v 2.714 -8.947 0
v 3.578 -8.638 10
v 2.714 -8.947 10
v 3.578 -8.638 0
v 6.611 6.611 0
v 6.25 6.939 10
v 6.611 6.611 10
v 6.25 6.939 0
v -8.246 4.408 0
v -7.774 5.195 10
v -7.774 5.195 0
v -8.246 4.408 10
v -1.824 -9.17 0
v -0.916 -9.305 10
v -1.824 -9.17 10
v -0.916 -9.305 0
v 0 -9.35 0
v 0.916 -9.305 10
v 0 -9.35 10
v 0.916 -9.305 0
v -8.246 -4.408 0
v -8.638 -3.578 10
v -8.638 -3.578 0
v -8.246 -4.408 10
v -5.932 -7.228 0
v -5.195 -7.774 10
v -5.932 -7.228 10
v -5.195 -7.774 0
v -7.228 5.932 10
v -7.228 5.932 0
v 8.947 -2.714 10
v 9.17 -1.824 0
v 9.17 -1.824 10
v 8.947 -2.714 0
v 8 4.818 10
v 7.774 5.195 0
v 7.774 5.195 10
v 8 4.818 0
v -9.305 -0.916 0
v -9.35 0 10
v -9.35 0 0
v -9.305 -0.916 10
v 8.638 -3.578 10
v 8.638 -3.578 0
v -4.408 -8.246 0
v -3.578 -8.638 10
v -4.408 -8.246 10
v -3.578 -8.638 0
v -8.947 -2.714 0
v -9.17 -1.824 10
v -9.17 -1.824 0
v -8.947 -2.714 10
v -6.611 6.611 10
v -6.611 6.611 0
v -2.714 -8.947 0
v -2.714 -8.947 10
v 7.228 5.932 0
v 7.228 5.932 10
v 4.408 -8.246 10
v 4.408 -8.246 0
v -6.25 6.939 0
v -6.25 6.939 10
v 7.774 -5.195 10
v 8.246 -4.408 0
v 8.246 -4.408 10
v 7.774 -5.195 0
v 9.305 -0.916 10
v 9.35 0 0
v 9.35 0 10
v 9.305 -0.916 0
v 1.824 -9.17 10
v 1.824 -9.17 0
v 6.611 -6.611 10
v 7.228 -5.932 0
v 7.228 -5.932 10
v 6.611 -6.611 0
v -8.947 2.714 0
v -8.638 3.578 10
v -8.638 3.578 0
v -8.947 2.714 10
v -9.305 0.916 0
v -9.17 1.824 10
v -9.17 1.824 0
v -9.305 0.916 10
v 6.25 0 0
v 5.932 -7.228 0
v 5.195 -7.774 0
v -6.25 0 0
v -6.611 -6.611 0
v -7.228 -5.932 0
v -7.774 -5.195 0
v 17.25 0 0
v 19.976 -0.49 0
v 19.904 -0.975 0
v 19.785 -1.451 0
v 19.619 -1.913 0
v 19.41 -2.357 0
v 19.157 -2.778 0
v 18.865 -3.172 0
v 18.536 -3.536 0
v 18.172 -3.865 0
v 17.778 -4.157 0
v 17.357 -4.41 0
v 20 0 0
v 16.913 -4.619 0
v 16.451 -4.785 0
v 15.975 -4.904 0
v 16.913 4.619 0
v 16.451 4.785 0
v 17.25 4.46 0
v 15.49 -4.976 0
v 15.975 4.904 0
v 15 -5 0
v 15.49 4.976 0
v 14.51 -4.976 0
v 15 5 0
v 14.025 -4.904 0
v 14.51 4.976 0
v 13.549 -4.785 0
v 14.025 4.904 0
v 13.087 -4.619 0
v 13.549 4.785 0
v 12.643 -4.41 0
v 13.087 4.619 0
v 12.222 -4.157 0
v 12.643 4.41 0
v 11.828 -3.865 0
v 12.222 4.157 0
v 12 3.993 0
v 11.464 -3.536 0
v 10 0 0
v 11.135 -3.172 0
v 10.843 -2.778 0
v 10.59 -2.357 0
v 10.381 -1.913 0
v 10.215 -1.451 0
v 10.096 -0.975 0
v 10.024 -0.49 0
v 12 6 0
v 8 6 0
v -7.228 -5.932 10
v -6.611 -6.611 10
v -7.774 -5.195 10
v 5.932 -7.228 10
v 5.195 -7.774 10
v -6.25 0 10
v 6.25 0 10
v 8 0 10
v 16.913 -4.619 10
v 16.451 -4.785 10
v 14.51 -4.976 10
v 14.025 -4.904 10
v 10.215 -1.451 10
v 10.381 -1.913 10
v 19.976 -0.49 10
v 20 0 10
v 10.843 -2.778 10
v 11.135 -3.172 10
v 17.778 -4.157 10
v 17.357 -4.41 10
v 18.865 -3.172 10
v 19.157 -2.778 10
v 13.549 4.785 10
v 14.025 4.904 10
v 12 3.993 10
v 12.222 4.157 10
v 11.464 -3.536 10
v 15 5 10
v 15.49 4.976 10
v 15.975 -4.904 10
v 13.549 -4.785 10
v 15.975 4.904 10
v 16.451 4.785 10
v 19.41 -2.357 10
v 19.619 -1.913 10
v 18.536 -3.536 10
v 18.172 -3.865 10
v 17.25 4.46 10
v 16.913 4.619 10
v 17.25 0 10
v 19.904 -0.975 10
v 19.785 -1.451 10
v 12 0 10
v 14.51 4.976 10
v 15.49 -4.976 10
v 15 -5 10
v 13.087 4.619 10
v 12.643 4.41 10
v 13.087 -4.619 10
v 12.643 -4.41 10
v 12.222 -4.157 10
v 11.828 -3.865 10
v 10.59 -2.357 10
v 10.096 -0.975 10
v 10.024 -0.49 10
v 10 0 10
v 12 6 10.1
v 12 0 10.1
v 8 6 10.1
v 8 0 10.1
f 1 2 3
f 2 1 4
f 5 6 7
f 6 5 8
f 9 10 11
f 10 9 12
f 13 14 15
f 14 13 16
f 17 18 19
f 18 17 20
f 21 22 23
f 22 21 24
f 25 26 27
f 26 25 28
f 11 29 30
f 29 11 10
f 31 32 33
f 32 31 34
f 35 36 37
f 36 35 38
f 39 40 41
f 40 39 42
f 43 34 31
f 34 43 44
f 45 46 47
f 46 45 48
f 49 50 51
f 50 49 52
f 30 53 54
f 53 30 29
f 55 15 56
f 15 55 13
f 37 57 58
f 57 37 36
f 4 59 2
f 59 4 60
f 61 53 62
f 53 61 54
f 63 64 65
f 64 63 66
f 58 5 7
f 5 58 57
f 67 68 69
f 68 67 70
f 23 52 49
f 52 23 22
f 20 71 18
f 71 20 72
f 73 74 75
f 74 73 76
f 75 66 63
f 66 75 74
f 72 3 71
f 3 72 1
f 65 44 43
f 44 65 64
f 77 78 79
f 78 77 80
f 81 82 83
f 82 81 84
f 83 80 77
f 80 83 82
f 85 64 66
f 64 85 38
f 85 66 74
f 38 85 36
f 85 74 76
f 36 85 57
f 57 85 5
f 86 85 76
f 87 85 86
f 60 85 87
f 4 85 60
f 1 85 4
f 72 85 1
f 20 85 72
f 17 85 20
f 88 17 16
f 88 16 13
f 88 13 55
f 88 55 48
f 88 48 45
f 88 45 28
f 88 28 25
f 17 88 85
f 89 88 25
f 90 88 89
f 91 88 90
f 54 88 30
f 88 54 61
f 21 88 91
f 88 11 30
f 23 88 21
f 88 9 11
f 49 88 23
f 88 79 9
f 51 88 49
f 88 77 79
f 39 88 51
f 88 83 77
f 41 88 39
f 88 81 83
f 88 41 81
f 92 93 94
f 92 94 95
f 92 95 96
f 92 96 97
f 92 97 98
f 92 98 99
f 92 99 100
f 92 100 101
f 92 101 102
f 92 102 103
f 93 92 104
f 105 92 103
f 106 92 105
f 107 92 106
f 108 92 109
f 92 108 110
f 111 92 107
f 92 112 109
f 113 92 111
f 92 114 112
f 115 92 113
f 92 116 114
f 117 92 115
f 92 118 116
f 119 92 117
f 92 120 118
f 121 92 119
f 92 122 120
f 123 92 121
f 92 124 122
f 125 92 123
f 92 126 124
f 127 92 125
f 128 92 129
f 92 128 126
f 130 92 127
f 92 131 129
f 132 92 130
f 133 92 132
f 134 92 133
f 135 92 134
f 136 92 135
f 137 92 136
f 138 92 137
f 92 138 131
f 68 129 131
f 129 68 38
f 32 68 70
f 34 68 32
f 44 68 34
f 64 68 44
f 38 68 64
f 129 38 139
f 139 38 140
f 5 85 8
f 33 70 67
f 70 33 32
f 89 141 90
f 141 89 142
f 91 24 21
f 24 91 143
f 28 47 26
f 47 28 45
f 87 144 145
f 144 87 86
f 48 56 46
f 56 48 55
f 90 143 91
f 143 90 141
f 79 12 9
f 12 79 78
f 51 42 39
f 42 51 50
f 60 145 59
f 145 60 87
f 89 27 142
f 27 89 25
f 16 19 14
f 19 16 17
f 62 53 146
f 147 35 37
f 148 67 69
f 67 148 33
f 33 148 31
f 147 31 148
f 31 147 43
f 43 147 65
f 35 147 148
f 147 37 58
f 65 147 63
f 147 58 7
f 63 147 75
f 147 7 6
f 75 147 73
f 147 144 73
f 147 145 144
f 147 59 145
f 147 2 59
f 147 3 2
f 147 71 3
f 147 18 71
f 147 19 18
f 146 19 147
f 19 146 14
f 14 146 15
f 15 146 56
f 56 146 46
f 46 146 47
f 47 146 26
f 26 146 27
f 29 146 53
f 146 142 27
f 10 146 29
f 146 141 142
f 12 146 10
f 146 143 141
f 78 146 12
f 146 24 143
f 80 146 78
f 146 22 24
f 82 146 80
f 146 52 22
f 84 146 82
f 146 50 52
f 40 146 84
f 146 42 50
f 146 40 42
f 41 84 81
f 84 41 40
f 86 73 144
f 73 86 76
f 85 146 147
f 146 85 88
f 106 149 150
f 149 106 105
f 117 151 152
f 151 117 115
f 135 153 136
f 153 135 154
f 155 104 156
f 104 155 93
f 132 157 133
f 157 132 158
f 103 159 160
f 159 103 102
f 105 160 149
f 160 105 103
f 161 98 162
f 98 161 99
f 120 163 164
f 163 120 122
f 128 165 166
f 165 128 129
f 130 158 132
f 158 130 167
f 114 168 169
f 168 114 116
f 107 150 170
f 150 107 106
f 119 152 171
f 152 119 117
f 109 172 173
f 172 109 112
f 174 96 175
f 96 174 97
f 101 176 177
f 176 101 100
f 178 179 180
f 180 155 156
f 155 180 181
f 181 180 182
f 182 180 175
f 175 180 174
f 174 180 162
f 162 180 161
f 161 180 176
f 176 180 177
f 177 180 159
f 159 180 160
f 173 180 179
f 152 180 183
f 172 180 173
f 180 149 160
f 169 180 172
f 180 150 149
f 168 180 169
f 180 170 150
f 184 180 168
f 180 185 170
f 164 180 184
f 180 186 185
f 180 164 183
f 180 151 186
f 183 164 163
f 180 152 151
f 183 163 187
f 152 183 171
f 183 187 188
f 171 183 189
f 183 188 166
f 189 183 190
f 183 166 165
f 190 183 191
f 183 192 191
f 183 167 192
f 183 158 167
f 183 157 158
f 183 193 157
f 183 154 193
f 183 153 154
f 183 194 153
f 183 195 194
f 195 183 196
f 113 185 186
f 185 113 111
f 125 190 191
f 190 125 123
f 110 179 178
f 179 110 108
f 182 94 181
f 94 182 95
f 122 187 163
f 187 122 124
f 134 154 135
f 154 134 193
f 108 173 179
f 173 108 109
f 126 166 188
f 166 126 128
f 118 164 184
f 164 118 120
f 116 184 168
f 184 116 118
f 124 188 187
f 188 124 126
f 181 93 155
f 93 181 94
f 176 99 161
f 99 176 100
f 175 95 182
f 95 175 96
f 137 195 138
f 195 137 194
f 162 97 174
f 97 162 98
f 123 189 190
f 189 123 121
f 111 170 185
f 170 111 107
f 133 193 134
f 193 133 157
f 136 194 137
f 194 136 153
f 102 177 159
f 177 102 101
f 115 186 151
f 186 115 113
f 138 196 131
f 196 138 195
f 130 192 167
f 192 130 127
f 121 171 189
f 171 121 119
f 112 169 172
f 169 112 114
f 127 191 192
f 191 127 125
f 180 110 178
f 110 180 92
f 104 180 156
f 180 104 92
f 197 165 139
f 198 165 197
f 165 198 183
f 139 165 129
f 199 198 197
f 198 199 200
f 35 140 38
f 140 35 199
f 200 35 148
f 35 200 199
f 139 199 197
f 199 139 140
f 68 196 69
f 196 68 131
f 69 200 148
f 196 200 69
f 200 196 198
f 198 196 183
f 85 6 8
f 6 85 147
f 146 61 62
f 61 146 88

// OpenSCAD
// Snap-on Clip for Lab Stand Rod and Tubing
// Orientation: Flat on XY plane, building upward (+Z)
// Units: Millimetres

// --- Dimensions ---
// Rod Ring
$rod_id = 12.7;      // Inner diameter of rod ring
$rod_wall = 3.0;     // Wall thickness of rod ring
$rod_od = $rod_id + 2 * $rod_wall; // Outer diameter (18.7 mm)

// Tubing Ring
$tube_id = 6.0;      // Inner diameter of tubing ring
$tube_wall = 2.0;    // Wall thickness of tubing ring
$tube_od = $tube_id + 2 * $tube_wall; // Outer diameter (10 mm)
$tube_x = 15;        // X position of tubing ring center

// Bridge
$bridge_x_start = 8;
$bridge_x_end = 12;
$bridge_width_x = $bridge_x_end - $bridge_x_start; // 4 mm
$bridge_height_y = 6; // Height in Y
$height = 10;        // Height of extrusion

// Cutout Dimensions
$cutout_rod_width = 10; // Width of opening on rod ring (-X side)
$cutout_rod_height = 10; // Height of opening on rod ring (-5 < y < 5)

$cutout_tube_width = 4.5; // Width of opening on tubing ring (+X side)
$cutout_tube_height = 4.5; // Height of opening on tubing ring (-2.25 < y < 2.25)

// Resolution for curves
$fn = 64;

// --- Main Body Construction ---
difference() {
    union() {
        // 1. Rod Ring
        difference() {
            cylinder(
                h = $height,
                d = $rod_od,
                center = [0, 0, 0]
            );
            // Cutout on -X side for rod snap
            translate([-($cutout_rod_width/2), 0, 0]) {
                cube([
                    $cutout_rod_width, 
                    $cutout_rod_height, 
                    $height + 0.1
                ]);
            }
        }
        
        // 2. Tubing Ring
        difference() {
            translate([$tube_x, 0, 0]) {
                cylinder(
                    h = $height,
                    d = $tube_od,
                    center = [0, 0, 0]
                );
            }
            // Cutout on +X side for tubing snap
            translate([($cutout_tube_width/2), 0, 0]) {
                translate([$tube_x, 0, 0]) {
                    cube([
                        $cutout_tube_width, 
                        $cutout_tube_height, 
                        $height + 0.1
                    ]);
                }
            }
        }
        
        // 3. Solid Bridge
        // Positioned between x=8 and x=12, centered at y=0
        translate([$bridge_x_start, 0, 0]) {
            cube([
                $bridge_width_x, 
                $bridge_height_y, 
                $height + 0.1
            ]);
        }
    }
    
    // --- Cutouts to ensure clean separation and proper fit ---
    // Extend cuts slightly past the faces (Z direction) to ensure no coplanar faces
    
    // Cutout Rod Ring (-X side) - Extended slightly
    translate([-($cutout_rod_width/2), 0, 0]) {
        cube([
            $cutout_rod_width + 0.1, 
            $cutout_rod_height + 0.1, 
            $height + 0.1
        ]);
    }
    
    // Cutout Tubing Ring (+X side) - Extended slightly
    translate([($cutout_tube_width/2), 0, 0]) {
        translate([$tube_x, 0, 0]) {
            cube([
                $cutout_tube_width + 0.1, 
                $cutout_tube_height + 0.1, 
                $height + 0.1
            ]);
        }
    }
    
    // Optional: Small clearance cutouts on the inner faces of the rings 
    // to ensure the rod and tube slide in easily without friction from the print surface
    // Rod Inner Face Cutout (slightly inside the ID)
    translate([-($rod_id/2) + 0.1, 0, 0]) {
        cube([
            $rod_id - 0.2, 
            $height + 0.1, 
            $height + 0.1
        ]);
    }
    
    // Tubing Inner Face Cutout (slightly inside the ID)
    translate([$tube_x, 0, 0]) {
        translate([($tube_id/2) - 0.1, 0, 0]) {
            cube([
                $tube_id - 0.2, 
                $height + 0.1, 
                $height + 0.1
            ]);
        }
    }
}
